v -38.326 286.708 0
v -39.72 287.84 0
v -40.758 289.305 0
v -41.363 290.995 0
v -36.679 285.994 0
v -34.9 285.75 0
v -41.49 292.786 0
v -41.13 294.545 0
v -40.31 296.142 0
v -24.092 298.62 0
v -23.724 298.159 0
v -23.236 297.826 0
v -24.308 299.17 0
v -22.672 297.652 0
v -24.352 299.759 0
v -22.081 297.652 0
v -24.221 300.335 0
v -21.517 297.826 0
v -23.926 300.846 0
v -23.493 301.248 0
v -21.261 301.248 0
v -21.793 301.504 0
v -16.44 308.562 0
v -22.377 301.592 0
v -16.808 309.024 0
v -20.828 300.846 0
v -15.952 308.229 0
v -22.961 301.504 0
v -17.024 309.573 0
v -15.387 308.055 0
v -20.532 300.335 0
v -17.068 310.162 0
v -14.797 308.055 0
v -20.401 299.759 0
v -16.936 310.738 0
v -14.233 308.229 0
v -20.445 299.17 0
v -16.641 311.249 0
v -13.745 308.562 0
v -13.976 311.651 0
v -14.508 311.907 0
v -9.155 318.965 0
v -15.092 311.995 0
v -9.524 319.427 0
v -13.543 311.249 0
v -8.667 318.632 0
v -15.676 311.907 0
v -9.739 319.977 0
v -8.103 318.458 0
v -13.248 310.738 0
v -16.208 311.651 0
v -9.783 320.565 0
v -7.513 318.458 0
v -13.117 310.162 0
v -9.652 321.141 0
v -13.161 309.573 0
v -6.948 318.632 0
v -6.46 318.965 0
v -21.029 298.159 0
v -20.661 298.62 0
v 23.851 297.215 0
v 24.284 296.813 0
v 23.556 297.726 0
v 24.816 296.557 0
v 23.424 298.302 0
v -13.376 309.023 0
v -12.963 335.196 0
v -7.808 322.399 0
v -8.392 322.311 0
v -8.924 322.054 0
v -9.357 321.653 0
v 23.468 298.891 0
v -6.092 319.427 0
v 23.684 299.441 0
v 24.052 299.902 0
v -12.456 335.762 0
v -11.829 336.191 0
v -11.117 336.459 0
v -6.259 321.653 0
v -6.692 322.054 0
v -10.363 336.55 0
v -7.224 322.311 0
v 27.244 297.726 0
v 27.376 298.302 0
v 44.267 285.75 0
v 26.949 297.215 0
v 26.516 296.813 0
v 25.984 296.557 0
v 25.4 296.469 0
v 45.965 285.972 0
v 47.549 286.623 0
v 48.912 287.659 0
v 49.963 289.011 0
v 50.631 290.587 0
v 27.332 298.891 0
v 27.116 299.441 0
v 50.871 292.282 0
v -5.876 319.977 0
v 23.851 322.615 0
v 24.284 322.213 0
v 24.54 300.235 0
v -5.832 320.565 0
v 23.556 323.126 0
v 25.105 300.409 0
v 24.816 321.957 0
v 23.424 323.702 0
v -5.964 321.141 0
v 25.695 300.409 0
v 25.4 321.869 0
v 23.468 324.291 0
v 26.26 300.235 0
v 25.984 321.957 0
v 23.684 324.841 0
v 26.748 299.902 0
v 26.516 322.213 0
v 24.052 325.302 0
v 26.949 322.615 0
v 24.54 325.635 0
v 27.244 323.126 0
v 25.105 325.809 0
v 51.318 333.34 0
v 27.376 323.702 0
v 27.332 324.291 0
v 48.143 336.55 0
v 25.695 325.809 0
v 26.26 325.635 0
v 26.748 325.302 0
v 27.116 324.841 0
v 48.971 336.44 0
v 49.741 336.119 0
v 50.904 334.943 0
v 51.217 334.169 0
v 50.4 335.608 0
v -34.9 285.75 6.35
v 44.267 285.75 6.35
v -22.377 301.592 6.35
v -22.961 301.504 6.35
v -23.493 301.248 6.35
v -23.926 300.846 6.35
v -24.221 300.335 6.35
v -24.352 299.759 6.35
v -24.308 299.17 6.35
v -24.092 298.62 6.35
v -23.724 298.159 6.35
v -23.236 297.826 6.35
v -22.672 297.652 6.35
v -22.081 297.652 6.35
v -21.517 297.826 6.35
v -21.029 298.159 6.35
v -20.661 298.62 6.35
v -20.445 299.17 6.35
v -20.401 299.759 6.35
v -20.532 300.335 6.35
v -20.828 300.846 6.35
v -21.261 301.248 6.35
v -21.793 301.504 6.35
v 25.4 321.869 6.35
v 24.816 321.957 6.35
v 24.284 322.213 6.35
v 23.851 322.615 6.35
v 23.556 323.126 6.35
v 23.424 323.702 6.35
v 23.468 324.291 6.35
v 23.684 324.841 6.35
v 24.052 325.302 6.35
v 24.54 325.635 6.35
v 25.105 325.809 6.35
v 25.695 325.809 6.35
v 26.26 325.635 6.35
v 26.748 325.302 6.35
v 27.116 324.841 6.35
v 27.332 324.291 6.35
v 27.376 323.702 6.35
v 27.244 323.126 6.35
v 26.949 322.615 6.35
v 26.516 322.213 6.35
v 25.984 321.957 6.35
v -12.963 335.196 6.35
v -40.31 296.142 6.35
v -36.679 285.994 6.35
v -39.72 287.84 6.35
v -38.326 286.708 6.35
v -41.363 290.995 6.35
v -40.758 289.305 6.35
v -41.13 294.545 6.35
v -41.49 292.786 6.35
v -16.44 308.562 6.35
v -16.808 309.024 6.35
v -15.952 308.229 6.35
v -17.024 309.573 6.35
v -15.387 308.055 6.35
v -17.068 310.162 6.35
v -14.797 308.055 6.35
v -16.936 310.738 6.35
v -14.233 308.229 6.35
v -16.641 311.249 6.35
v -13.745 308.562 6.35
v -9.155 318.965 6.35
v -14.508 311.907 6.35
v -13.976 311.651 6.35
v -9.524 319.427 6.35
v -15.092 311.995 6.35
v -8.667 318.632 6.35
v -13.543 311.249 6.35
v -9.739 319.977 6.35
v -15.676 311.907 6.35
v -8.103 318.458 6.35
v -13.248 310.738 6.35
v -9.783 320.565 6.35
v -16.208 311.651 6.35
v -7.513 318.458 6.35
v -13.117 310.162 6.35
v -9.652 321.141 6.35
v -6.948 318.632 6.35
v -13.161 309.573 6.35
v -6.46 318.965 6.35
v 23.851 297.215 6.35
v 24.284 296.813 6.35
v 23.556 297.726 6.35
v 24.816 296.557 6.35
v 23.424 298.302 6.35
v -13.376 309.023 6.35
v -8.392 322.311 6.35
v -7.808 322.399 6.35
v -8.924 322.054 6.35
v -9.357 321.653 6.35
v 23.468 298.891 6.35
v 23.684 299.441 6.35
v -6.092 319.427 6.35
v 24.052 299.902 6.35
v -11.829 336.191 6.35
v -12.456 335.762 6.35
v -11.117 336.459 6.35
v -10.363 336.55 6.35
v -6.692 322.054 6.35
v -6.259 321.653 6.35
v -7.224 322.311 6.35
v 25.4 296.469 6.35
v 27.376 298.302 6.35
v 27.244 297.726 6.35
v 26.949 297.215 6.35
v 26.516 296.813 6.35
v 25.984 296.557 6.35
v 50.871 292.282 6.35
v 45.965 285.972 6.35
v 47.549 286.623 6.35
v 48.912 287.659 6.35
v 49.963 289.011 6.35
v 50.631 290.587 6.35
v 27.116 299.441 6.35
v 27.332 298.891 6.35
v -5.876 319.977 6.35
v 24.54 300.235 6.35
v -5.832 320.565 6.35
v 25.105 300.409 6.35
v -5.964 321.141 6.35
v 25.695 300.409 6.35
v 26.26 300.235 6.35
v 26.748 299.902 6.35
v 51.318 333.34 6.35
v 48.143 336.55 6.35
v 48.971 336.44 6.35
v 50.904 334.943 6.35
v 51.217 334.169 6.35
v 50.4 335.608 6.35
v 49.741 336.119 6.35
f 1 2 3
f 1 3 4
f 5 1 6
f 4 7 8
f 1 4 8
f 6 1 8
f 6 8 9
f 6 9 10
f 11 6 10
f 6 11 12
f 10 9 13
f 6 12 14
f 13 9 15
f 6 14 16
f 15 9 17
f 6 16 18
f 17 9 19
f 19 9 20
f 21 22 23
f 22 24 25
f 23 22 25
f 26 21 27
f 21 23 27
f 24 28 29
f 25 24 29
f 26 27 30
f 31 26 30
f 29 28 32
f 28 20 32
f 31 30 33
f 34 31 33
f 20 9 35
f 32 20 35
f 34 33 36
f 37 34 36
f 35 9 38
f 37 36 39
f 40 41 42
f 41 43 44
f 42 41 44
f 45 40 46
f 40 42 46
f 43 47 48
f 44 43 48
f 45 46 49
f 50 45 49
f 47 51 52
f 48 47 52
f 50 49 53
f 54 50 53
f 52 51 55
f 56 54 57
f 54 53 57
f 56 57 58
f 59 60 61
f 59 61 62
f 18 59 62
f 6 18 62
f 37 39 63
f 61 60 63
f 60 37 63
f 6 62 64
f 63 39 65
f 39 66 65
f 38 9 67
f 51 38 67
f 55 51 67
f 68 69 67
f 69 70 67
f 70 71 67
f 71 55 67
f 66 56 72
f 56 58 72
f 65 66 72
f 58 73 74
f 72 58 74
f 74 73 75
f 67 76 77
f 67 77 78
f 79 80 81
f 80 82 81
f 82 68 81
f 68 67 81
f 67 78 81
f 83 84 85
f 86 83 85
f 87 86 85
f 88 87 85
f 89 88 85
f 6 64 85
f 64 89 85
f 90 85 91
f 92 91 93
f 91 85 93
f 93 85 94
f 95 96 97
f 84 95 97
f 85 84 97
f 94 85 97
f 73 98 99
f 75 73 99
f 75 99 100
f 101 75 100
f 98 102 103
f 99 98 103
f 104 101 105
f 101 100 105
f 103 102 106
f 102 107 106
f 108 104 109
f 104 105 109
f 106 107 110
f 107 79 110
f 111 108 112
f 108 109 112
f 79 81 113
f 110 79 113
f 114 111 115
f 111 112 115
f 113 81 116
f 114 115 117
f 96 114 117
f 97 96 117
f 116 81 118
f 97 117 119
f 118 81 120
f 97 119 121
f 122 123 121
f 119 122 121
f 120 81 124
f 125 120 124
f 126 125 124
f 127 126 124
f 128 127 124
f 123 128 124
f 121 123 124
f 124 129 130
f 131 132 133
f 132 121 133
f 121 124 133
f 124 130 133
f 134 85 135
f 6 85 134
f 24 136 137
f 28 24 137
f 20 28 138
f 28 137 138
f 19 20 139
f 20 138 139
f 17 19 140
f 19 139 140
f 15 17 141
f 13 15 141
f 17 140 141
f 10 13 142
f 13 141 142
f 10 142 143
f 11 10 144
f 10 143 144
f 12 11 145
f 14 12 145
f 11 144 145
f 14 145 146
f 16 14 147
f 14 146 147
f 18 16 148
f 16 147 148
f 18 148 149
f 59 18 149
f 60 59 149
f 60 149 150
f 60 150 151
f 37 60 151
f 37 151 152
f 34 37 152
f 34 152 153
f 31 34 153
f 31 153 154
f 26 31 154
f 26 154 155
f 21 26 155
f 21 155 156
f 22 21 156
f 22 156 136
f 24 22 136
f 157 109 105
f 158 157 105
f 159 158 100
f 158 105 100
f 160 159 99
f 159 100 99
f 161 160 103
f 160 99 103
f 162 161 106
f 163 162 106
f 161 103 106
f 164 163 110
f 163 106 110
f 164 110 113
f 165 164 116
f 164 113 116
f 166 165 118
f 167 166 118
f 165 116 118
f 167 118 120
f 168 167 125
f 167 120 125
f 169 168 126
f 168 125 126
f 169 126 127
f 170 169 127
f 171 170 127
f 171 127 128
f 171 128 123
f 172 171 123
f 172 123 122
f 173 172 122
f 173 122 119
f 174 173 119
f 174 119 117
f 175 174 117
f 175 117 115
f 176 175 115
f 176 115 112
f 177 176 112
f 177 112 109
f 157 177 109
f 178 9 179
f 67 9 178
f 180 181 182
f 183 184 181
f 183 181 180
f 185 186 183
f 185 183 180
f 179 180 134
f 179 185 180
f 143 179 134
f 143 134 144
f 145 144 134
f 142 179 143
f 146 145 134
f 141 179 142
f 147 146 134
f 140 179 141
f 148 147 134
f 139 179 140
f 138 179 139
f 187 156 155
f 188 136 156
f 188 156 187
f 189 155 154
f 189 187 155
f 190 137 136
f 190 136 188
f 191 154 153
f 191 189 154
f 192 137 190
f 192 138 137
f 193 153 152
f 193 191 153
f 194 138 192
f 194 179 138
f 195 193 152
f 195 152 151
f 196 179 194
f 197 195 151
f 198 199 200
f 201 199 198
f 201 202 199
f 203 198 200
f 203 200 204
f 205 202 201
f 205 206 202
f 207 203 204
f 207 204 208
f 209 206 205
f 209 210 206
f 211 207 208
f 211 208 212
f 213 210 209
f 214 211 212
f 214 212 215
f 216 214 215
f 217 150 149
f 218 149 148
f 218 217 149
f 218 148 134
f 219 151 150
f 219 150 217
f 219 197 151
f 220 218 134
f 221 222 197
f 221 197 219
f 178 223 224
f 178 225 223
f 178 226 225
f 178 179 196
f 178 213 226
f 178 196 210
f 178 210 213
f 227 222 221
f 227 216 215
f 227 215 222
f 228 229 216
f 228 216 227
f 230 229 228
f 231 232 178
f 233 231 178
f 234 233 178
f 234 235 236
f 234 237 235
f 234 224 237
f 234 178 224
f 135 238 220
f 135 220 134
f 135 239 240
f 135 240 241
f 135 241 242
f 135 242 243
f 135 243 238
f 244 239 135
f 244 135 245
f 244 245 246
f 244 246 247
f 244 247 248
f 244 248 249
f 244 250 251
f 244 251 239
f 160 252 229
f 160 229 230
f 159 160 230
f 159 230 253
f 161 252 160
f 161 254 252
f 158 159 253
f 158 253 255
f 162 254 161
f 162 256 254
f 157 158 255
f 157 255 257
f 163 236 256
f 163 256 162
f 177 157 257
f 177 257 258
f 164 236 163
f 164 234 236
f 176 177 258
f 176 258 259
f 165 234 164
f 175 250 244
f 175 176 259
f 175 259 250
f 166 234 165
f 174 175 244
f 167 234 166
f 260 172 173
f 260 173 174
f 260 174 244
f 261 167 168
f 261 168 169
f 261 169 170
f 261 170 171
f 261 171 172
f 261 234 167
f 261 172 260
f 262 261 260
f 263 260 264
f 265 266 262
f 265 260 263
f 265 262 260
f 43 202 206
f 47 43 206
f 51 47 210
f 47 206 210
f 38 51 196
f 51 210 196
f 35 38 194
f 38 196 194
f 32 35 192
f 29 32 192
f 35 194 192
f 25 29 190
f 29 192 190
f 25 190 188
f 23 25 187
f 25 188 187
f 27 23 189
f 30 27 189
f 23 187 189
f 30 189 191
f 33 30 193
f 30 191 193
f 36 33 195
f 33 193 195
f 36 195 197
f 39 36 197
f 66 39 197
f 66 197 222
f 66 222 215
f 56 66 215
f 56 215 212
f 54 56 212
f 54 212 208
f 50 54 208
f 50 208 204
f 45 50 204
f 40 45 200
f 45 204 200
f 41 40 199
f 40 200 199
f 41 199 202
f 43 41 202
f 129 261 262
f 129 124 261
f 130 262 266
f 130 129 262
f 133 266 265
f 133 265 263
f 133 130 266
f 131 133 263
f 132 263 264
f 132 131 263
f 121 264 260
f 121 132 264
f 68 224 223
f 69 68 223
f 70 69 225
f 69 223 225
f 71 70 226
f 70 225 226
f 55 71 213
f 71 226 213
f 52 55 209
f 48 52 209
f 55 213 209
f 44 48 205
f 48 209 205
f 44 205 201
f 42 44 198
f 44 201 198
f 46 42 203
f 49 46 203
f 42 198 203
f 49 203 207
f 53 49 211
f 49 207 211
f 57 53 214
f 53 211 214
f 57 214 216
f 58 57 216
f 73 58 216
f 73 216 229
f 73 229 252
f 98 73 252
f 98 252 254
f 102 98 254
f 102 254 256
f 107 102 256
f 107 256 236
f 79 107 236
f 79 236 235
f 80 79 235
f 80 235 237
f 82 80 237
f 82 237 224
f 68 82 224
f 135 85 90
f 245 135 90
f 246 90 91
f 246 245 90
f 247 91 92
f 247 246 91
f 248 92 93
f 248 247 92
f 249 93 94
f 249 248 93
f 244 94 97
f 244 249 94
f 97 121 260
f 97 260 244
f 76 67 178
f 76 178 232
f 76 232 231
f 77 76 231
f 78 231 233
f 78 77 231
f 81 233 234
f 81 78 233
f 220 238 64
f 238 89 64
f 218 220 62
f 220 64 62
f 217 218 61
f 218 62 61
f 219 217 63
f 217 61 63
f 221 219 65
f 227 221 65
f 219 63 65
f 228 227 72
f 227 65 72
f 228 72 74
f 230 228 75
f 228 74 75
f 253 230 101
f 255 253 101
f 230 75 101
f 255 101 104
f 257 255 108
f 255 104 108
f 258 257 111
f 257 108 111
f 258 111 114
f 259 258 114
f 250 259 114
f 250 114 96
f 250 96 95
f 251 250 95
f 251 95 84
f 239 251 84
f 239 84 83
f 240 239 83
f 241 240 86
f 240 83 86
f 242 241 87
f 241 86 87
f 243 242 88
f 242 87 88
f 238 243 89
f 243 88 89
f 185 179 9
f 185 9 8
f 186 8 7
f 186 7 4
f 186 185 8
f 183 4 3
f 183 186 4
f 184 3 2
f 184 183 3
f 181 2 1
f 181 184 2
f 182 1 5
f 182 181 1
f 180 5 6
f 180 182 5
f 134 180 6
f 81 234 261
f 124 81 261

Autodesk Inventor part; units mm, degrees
ref_plane "YZ Plane" through (0, 0, 0) normal (1, 0, 0) x (0, 1, 0)
ref_plane "XZ Plane" through (0, 0, 0) normal (0, 1, 0) x (-1, 0, 0)
ref_plane "XY Plane" through (0, 0, 0) normal (0, 0, 1) x (1, 0, 0)
sketch "Sketch1" plane through (0, 0, 0) normal (0, 0, 1) x (1, 0, 0)
  line L0 (0, 0) -> (50.8, 0) construction
  line L1 (50.8, 0) -> (50.8, 387.35) construction
  line L2 (50.8, 387.35) -> (0, 387.35) construction
  line L3 (0, 387.35) -> (0, 0) construction
  line L4 (20.8065, 339.141) -> (-226.8638, -14.5688) construction
  line L5 (-226.8638, -14.5688) -> (-247.6703, 0) construction
  line L6 (-247.6703, 0) -> (0, 353.7099) construction
  line L7 (0, 353.7099) -> (20.8065, 339.141) construction
  line L8 (-247.6703, 0) -> (-216.6626, 0) construction
  line L9 (0, 353.7099) -> (0, 309.4263) construction
  dimension "d0" = 50.8
  dimension "d1" = 387.35
  dimension "d2" = 25.4
  dimension "d3" = 431.8
  dimension "d5" = 55
sketch "Sketch2" plane through (0, 0, 0) normal (0, 0, 1) x (1, 0, 0)
  line L0 (0, 0) -> (50.8, 0) construction
  line L1 (50.8, 0) -> (50.8, 387.35) construction
  line L2 (50.8, 387.35) -> (0, 387.35) construction
  line L3 (0, 387.35) -> (0, 0) construction
  line L4 (20.8065, 339.141) -> (-226.8638, -14.5688) construction
  line L5 (-226.8638, -14.5688) -> (-247.6703, 0) construction
  line L6 (-247.6703, 0) -> (0, 353.7099) construction
  line L7 (0, 353.7099) -> (20.8065, 339.141) construction
  line L8 (-247.6703, 0) -> (-216.6626, 0) construction
  line L9 (0, 353.7099) -> (0, 309.4263) construction
  circle A0 centre (12.7, 431.8) radius 11.176
  circle A1 centre (12.7, 431.8) radius 23.8125 construction
  circle A2 centre (12.7, 431.8) radius 39.6875 construction
  line L10 (-47.586, 285.75) -> (0, 353.7099)
  line L11 (0, 387.35) -> (0, 353.7099)
  line L12 (0, 387.35) -> (-16.2292, 404.6302)
  line L13 (52.3851, 431.368) -> (50.8, 285.75)
  line L14 (50.8, 285.75) -> (-47.586, 285.75)
  arc A3 (52.3851, 431.368) -> (-16.2292, 404.6302) centre (12.7, 431.8) ccw
  line L15 (12.7, 374.65) -> (38.1, 374.65) construction
  line L16 (10.4032, 346.4254) -> (-237.2671, -7.2844) construction
  point P0 (25.4, 0)
  point P1 (-7.8078, 320.4174)
  point P2 (-15.0922, 310.0141)
  point P3 (-22.3767, 299.6109)
  point P4 (25.4, 374.65)
  point P5 (25.4, 374.65)
  point P6 (25.4, 387.35)
  dimension "d6" = 22.352
  dimension "d7" = 47.625
  dimension "d8" = 15.875
  dimension "d10" = 12.7
  dimension "d11" = 431.8
  dimension "d12" = 101.6
  dimension "d13" = 25.4
  dimension "d14" = 12.7
  dimension "d15" = 12.7
  dimension "d16" = 12.7
  dimension "d56" = 31.75
extrude "Extrusion1" add sketch "Sketch2" along normal blind 6.35
hole "Hole1" at (0, 0, 0) at (50.8, 0, 0) at (-226.8638, -14.5688, 0) at (-247.6703, 0, 0) at (-216.6626, 0, 0) at (-7.8078, 320.4174, 0) at (-15.0922, 310.0141, 0) at (-22.3767, 299.6109, 0) at (12.7, 374.65, 0) at (25.4, 374.65, 0) at (38.1, 374.65, 0) direction (0, 0, 1) diameter 3.9624 end through all thread size "10-32 UNF" class "2B" standard "ANSI Unified Screw Threads"
fillet "Fillet1" radius 6.604 3 edges at (0, 353.7099, 3.175) (-47.586, 285.75, 3.175) (50.8, 285.75, 3.175)
sketch "Sketch3" plane through (0, 0, 0) normal (0, 0, -1) x (-1, 0, 0)
  arc A0 (-50.8711, 292.2821) -> (-44.2675, 285.75) centre (-44.2675, 292.354) ccw construction
  line L0 (34.8998, 285.75) -> (-44.2675, 285.75) construction
  arc A1 (34.8998, 285.75) -> (40.3095, 296.1419) centre (34.8998, 292.354) ccw construction
  line L1 (1.1943, 352.0042) -> (40.3095, 296.1419) construction
  arc A2 (0, 355.7921) -> (1.1943, 352.0042) centre (6.604, 355.7921) ccw construction
  line L2 (0, 387.35) -> (0, 355.7921) construction
  line L3 (16.2292, 404.6302) -> (0, 387.35) construction
  arc A3 (16.2292, 404.6302) -> (-52.3851, 431.368) centre (-12.7, 431.8) ccw construction
  line L4 (-50.8711, 292.2821) -> (-52.3851, 431.368) construction
  circle A4 centre (-25.4, 374.65) radius 1.9812 construction
  circle A5 centre (22.3767, 299.6109) radius 1.9812 construction
  circle A6 centre (7.8078, 320.4174) radius 1.9812 construction
  circle A7 centre (15.0922, 310.0141) radius 1.9812 construction
  circle A8 centre (-12.7, 374.65) radius 1.9812 construction
  circle A9 centre (-38.1, 374.65) radius 1.9812 construction
  circle A10 centre (-12.7, 431.8) radius 11.176 construction
  circle A11 centre (-12.7, 431.8) radius 23.8125
  circle A12 centre (-12.7, 431.8) radius 11.176 construction
  circle A13 centre (-12.7, 431.8) radius 31.75 construction
  point P0 (0, 0)
  point P1 (-12.7, 463.55)
  point P2 (-44.45, 431.8)
  point P3 (-12.7, 400.05)
  point P4 (19.05, 431.8)
  dimension "d29" = 63.5
  dimension "d28" = 47.625
  dimension "d32" = 360
extrude "Extrusion2" cut sketch "Sketch3" against normal blind 3.175
hole "Hole2" at (12.7, 463.55, 0) at (44.45, 431.8, 0) at (12.7, 400.05, 0) at (-19.05, 431.8, 0) direction (0, 0, 1) diameter 3.9624 end through all thread size "10-32 UNF" class "2B" standard "ANSI Unified Screw Threads"
sketch "Sketch4" plane through (0, 0, 6.35) normal (0, 0, 1) x (1, 0, 0)
  line L0 (-1.1943, 352.0042) -> (-40.3095, 296.1419) projected
  line L1 (-12.0155, 336.55) -> (51.353, 336.55)
  line L2 (50.8711, 292.2821) -> (52.3851, 431.368) projected
  line L3 (-34.8998, 285.75) -> (44.2675, 285.75) projected
  arc A0 (-40.3095, 296.1419) -> (-34.8998, 285.75) centre (-34.8998, 292.354) ccw projected
  arc A1 (44.2675, 285.75) -> (50.8711, 292.2821) centre (44.2675, 292.354) ccw projected
  point P0 (0, 0)
  dimension "d43" = 50.8
extrude "Extrusion3" cut sketch "Sketch4" against normal through all keep common part
fillet "Fillet2" radius 3.175 2 edges at (-12.0155, 336.55, 3.175) (51.353, 336.55, 3.175)
sketch "Sketch5" plane through (0, 0, 6.35) normal (0, 0, 1) x (1, 0, 0)
  line L0 (50.8, 387.35) -> (0, 387.35) construction
  line L1 (25.4, 323.85) -> (25.4, 298.45) construction
  line L2 (-34.8998, 285.75) -> (44.2675, 285.75) construction
  point P0 (0, 0)
  point P1 (25.4, 387.35)
  dimension "d47" = 25.4
  dimension "d48" = 12.7
hole "Hole3" at (25.4, 323.85, 6.35) at (25.4, 298.45, 6.35) direction (0, 0, -1) diameter 3.9624 end through all thread size "10-32 UNF" class "2B" standard "ANSI Unified Screw Threads"
properties part number "CL7-011" material "Aluminum 6061"
